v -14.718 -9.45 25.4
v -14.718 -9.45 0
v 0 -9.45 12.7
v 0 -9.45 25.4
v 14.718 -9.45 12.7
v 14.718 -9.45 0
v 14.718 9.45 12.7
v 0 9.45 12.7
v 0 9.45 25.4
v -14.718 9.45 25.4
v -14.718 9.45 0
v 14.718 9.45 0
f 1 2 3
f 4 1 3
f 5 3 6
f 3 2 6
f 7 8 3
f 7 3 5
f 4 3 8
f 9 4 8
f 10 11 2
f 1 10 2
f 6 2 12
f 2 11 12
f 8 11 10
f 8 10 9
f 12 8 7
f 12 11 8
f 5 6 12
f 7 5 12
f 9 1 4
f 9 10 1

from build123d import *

# Parameters (mm, degrees)
F1_DEPTH = 12.7
F2_W     = 14.7177
F2_H     = 9.450314
F3_DEPTH = 12.7


with BuildPart() as f1:
    # F0 (on Top) → F1 (new body)
    with BuildSketch(Plane.XY):
        Polygon((-14.7177, -9.450314), (14.7177, -9.450314), (14.7177, 9.450314), (-14.7177, 9.450314), (-14.7177, 0), align=None)
    extrude(amount=F1_DEPTH)

    # F2 (on face) → F3 (join)
    with BuildSketch(Plane.XY.offset(12.7)):
        with Locations((-7.35885, -4.725157)):
            Rectangle(F2_W, F2_H)
        with Locations((-7.35885, 4.725157)):
            Rectangle(F2_W, F2_H)
    extrude(amount=F3_DEPTH)


solid = f1.part
